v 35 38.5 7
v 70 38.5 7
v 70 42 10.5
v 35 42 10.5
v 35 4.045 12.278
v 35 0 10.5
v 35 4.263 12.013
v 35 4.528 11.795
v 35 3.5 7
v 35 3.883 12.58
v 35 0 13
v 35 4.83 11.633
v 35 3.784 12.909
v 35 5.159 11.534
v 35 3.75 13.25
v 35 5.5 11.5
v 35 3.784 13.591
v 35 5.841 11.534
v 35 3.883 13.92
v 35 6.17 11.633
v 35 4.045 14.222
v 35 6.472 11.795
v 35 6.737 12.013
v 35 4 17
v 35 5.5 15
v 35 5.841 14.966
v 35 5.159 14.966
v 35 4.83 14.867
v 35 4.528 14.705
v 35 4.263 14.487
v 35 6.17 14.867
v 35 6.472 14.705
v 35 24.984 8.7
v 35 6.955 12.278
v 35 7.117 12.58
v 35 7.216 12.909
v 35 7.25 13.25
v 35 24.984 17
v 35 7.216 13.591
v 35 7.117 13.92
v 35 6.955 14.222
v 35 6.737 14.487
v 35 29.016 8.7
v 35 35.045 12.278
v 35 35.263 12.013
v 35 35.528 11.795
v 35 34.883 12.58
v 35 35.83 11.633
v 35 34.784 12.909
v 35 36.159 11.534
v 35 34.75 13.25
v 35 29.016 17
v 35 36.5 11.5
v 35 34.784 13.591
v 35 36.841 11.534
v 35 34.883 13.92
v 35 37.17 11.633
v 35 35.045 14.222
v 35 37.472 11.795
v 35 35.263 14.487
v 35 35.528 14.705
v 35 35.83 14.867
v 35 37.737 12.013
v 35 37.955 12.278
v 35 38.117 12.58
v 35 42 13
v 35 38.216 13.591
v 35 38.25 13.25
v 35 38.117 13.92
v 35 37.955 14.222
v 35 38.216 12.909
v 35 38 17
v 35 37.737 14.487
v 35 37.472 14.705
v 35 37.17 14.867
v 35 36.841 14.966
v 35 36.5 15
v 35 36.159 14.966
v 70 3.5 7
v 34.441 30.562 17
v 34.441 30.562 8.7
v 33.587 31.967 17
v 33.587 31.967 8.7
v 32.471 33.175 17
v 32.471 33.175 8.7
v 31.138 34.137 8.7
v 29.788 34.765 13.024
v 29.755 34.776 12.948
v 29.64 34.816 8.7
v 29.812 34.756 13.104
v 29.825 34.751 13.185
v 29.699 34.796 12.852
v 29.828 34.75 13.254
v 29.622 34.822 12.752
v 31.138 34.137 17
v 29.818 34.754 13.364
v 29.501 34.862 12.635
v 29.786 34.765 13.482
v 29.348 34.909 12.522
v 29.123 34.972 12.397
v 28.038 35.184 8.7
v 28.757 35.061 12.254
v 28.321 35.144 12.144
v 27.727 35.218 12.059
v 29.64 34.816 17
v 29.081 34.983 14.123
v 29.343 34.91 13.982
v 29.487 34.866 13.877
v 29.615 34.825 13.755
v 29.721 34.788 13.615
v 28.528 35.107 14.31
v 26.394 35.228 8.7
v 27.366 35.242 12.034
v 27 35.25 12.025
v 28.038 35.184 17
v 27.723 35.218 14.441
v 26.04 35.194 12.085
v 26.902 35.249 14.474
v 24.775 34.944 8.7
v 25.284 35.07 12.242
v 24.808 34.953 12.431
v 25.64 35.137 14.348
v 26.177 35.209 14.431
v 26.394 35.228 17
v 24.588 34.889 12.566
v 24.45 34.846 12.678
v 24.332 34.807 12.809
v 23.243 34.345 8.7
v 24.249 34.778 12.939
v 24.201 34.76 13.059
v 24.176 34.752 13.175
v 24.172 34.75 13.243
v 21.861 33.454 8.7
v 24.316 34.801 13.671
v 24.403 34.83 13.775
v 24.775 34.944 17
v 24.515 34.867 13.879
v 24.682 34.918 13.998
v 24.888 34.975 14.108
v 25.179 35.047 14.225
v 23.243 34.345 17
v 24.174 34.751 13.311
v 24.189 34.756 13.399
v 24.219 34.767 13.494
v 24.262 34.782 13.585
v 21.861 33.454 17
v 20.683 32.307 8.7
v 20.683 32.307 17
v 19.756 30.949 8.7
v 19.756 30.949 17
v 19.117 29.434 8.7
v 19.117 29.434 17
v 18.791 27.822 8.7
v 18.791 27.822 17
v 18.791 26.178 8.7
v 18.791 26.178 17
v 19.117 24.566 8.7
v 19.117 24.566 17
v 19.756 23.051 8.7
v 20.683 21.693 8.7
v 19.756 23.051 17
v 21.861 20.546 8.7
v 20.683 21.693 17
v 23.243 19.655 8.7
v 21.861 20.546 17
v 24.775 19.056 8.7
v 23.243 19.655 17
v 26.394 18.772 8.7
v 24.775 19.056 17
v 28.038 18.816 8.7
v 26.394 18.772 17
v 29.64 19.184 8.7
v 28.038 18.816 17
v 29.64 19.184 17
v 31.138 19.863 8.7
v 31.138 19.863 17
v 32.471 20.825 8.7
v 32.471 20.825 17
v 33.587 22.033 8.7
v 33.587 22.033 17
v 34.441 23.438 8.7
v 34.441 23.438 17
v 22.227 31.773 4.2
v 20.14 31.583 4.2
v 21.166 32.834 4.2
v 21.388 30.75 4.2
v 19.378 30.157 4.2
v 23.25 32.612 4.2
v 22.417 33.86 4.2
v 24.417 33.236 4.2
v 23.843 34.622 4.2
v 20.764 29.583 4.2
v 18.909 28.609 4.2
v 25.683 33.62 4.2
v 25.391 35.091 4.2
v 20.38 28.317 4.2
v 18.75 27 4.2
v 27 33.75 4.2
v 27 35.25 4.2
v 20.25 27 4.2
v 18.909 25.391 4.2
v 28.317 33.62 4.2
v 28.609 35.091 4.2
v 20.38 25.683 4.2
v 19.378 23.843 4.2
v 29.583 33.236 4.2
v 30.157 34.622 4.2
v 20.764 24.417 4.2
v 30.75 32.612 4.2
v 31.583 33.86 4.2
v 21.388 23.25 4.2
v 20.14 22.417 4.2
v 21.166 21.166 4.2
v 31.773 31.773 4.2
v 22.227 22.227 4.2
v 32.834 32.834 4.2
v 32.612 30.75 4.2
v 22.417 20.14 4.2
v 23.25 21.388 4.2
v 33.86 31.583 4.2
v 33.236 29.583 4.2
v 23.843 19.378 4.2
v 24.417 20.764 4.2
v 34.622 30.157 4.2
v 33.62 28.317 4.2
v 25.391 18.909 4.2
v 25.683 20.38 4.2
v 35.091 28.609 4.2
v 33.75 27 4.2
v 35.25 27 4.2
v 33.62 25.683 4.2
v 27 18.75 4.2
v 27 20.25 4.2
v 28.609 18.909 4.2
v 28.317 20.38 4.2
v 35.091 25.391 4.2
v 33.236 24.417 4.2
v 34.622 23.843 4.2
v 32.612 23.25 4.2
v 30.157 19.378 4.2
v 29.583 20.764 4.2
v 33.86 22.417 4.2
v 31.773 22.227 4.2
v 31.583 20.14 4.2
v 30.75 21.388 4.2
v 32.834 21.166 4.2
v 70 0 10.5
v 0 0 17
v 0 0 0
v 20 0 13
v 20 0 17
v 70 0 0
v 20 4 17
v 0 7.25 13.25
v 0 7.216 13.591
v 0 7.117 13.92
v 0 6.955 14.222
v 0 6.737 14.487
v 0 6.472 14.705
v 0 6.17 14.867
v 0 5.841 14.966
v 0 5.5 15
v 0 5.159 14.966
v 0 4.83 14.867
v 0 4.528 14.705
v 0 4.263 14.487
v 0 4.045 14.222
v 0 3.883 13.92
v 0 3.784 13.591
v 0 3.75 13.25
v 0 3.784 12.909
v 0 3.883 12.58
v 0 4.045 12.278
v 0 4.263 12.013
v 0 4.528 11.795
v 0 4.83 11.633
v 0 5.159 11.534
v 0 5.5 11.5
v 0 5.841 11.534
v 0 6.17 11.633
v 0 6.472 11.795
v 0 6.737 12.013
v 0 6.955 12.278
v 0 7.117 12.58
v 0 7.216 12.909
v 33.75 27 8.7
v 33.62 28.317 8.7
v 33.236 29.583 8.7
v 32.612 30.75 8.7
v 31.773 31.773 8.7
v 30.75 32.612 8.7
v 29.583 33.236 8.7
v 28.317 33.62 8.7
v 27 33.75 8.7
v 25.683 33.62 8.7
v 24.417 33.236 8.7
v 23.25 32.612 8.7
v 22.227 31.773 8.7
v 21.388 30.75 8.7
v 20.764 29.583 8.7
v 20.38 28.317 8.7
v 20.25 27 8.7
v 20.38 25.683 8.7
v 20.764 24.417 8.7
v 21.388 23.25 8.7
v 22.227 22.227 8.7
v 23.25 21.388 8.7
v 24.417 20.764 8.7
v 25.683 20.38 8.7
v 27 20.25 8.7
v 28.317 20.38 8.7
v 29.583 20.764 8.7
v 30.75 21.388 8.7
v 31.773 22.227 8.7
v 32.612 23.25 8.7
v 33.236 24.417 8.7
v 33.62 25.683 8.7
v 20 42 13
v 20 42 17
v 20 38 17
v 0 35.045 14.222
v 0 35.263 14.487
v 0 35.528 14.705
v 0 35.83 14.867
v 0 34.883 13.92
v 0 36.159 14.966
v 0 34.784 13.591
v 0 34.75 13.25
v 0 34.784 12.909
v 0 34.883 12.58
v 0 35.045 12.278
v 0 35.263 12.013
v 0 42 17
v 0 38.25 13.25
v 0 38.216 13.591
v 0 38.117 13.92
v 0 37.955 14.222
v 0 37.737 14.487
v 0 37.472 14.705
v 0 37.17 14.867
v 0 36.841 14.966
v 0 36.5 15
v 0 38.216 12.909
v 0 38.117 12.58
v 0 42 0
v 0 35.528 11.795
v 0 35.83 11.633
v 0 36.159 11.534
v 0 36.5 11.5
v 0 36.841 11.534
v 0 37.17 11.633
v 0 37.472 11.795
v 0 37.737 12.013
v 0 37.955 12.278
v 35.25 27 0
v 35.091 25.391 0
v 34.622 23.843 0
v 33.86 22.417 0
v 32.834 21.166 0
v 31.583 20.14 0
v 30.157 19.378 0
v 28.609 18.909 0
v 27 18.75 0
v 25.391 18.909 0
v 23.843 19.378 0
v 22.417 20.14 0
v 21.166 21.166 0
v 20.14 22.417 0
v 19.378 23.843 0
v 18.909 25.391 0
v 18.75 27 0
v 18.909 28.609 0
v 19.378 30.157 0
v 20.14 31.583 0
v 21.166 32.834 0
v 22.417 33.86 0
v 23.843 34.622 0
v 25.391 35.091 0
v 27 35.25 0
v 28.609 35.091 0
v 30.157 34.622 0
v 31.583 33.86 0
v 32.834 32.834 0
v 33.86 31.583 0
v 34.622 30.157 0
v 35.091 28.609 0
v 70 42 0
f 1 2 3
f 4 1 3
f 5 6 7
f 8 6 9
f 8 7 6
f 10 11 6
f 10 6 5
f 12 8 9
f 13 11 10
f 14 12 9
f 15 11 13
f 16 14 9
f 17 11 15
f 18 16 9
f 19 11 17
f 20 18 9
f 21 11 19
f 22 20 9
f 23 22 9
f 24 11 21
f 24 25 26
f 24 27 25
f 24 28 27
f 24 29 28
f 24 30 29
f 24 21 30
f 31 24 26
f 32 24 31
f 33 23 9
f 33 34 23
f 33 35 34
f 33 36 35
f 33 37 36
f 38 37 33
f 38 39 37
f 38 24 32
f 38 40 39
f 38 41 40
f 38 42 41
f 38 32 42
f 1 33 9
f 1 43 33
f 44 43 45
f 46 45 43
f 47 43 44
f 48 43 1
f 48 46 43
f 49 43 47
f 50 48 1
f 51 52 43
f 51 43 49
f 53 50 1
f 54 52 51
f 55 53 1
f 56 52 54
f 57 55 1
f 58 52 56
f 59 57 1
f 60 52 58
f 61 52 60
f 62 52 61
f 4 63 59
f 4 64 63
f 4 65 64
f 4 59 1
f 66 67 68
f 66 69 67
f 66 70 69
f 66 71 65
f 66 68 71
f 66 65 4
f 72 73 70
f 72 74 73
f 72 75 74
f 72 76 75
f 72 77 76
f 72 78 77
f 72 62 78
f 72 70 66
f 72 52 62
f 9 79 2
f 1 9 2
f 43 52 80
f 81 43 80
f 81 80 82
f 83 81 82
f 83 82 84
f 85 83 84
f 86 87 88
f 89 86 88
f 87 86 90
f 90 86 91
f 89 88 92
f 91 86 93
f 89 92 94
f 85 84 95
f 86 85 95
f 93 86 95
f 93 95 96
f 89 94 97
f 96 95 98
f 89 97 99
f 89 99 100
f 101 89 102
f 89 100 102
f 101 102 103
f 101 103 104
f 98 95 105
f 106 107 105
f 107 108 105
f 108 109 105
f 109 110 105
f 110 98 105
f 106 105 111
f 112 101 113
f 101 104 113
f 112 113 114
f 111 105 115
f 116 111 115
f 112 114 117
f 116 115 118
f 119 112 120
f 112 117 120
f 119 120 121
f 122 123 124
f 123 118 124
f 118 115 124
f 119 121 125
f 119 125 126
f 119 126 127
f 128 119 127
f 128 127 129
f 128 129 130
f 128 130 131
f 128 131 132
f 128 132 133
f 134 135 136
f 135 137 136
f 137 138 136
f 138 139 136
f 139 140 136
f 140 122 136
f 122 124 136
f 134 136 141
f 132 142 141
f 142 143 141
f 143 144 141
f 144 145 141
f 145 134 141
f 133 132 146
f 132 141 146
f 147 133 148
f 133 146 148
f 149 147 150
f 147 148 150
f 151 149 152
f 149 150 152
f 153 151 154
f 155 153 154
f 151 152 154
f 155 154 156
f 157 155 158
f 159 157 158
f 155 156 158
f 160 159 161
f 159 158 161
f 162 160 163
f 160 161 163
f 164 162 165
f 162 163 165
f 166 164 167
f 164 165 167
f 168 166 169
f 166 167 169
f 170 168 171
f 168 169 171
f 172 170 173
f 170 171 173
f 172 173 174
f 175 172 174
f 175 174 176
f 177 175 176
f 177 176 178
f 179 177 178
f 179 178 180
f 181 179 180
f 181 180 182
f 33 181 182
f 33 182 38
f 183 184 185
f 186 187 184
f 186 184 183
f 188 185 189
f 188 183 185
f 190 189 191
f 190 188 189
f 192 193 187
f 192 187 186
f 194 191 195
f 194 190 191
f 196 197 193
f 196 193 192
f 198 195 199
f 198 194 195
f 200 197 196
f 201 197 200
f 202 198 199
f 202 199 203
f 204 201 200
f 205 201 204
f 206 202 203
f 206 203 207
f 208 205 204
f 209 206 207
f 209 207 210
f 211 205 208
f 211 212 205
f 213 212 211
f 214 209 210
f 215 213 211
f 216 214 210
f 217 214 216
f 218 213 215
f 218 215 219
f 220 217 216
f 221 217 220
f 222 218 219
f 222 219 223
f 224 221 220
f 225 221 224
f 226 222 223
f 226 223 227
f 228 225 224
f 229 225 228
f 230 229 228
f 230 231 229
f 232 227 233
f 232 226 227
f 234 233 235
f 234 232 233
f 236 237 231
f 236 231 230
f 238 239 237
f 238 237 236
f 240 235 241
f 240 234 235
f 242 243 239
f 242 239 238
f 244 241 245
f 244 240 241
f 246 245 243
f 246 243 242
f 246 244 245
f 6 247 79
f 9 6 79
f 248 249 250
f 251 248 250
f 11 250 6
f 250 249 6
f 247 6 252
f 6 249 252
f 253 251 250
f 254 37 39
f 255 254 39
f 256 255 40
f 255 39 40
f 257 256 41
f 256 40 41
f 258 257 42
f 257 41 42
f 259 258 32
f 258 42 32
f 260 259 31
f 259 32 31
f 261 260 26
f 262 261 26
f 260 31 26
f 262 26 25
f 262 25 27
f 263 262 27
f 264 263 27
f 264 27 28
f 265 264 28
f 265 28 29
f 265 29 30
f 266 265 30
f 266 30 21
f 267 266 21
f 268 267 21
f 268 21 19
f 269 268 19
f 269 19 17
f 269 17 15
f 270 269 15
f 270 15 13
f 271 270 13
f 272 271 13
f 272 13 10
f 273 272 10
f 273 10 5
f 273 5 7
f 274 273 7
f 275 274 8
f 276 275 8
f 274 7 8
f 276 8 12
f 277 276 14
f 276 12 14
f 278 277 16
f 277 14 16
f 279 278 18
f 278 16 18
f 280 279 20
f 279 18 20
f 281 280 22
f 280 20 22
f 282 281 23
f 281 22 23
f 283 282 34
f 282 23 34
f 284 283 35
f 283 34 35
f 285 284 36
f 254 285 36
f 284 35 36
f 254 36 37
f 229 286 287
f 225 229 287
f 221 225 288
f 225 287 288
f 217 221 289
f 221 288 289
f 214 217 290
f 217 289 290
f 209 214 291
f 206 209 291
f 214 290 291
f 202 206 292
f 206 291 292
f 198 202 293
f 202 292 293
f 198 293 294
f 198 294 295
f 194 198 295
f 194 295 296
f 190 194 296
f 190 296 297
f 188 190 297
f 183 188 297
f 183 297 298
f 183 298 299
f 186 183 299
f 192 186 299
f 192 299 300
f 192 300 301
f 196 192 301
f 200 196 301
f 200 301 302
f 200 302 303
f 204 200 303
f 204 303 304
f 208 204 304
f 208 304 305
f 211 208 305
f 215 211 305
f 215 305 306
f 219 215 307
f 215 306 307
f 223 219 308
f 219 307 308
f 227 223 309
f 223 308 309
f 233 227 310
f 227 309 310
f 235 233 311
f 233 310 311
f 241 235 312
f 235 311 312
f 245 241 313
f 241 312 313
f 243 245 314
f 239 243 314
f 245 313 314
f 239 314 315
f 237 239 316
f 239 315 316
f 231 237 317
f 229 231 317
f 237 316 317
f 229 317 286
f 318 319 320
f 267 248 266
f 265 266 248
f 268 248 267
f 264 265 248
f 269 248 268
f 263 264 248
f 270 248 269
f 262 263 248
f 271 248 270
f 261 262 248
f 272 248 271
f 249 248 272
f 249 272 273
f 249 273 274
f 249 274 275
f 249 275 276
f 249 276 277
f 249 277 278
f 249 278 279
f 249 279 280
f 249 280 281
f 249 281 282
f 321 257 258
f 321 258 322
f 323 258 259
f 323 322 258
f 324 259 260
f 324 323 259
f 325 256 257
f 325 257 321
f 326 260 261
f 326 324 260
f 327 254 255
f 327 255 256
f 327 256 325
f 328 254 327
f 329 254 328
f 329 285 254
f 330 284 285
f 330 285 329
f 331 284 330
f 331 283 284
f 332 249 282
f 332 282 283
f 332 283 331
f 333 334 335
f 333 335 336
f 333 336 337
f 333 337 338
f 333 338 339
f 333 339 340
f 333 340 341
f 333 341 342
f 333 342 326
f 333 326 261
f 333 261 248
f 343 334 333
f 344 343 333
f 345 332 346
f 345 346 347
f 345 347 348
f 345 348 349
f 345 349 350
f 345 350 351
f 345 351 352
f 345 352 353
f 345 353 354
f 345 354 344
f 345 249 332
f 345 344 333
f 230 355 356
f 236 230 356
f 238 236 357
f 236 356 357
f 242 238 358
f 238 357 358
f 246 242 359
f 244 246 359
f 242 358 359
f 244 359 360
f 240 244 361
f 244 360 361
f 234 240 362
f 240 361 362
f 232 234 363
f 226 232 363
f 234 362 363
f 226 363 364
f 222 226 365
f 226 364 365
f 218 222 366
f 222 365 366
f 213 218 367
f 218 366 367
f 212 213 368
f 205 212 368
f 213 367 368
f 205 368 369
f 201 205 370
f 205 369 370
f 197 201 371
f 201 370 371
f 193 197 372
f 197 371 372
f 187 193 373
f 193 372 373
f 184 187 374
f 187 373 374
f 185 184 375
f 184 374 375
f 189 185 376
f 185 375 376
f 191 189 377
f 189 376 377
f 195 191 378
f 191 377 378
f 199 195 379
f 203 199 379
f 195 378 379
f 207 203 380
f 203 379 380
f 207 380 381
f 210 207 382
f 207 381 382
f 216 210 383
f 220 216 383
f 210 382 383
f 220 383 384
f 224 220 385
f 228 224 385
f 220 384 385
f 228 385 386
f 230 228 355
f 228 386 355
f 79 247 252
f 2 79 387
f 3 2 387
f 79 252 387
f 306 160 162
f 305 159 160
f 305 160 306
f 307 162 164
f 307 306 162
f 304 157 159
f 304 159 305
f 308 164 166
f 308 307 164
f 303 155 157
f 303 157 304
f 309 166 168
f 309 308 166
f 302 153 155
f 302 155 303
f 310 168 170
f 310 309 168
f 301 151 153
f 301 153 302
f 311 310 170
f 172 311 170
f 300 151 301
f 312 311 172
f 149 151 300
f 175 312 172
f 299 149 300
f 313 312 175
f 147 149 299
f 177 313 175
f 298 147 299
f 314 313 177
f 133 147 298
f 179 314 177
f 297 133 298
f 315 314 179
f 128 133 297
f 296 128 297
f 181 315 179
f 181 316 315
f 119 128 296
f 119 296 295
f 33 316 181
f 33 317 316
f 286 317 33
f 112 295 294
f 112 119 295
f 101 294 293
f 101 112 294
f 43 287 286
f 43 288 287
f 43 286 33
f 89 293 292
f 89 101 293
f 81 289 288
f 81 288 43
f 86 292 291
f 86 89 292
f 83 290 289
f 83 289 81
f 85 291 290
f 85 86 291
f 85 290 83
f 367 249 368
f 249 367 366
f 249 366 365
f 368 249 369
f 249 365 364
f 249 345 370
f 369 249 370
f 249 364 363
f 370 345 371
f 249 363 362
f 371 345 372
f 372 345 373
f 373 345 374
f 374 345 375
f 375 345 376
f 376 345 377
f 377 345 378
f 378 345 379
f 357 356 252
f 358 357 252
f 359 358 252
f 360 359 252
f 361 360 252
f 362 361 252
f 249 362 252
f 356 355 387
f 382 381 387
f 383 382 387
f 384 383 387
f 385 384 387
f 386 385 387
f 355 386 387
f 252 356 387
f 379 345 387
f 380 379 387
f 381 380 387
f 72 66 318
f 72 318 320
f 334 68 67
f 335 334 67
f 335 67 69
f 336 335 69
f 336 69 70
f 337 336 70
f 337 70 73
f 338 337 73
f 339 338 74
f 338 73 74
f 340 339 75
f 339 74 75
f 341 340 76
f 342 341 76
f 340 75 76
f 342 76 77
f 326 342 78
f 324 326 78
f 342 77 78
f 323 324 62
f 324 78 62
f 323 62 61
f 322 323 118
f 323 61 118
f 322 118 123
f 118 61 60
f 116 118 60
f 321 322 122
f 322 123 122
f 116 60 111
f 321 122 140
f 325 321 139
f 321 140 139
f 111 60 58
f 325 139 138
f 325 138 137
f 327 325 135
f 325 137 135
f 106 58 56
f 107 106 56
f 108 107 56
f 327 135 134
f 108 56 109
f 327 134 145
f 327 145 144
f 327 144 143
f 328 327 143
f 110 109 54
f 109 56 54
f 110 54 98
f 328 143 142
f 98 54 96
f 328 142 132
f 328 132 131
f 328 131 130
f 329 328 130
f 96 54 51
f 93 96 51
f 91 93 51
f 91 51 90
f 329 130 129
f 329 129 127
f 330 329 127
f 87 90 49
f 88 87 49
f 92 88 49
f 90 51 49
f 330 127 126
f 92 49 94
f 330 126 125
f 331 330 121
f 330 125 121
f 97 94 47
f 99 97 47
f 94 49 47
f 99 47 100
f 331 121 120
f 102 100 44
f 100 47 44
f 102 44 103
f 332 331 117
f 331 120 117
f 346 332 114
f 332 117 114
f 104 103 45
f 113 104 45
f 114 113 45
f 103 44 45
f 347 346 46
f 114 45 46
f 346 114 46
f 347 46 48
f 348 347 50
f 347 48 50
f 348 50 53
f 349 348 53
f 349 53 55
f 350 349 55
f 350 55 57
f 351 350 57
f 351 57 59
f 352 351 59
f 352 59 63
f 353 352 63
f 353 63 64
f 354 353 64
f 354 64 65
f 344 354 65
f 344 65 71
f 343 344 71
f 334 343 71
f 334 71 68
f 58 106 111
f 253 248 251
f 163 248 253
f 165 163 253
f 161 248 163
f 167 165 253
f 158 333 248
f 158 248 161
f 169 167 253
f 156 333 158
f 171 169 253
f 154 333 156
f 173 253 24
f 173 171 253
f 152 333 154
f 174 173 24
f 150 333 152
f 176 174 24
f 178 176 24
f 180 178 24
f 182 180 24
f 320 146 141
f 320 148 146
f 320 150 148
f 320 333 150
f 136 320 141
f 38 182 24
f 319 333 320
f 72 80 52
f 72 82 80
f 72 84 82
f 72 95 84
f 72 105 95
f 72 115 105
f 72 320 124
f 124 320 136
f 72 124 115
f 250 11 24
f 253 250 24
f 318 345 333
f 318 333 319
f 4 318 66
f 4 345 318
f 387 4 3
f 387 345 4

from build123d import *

# Parameters (mm, degrees)
BOX_W           = 70
BOX_H           = 42
BOX_DEPTH       = 17
SKETCH_R        = 1.75
POCKET_DEPTH    = 70.001
POCKET001_DEPTH = 50
POCKET002_DEPTH = 35
SKETCH003_R     = 6.75
POCKET003_DEPTH = 17.001
SKETCH004_R     = 8.25
POCKET004_DEPTH = 8.3
SKETCH005_R     = 8.25
POCKET005_DEPTH = 4.2


with BuildPart() as part:
    # Box → Box (new body)
    with BuildSketch(Plane.XY):
        with Locations((35, 21)):
            Rectangle(BOX_W, BOX_H)
    extrude(amount=BOX_DEPTH)

    # Sketch (on Face2 of BaseFeature) → Pocket (cut, through all)
    with BuildSketch(Plane.YZ.offset(70)):
        with Locations((5.5, 13.25)):
            Circle(SKETCH_R)
        with Locations((36.5, 13.25)):
            Circle(SKETCH_R)
    extrude(amount=-POCKET_DEPTH, mode=Mode.SUBTRACT)

    # Sketch001 (on Face2 of BaseFeature) → Pocket001 (cut)
    with BuildSketch(Plane.YZ.offset(70)):
        Polygon((4, 17), (0, 17), (0, 13), align=None)
        Polygon((38, 17), (42, 17), (42, 13), align=None)
    extrude(amount=-POCKET001_DEPTH, mode=Mode.SUBTRACT)

    # Sketch002 (on Face8 of Pocket001) → Pocket002 (cut)
    with BuildSketch(Plane.YZ.offset(70)):
        Polygon((4, 17), (0, 13), (0, 10.5), (3.5, 7), (38.5, 7), (42, 10.5), (42, 13), (38, 17), align=None)
    extrude(amount=-POCKET002_DEPTH, mode=Mode.SUBTRACT)

    # Sketch003 (on Face3 of Pocket002) → Pocket003 (cut, through all)
    with BuildSketch(Plane.XY.offset(17)):
        with Locations((27, 27)):
            Circle(SKETCH003_R)
    extrude(amount=-POCKET003_DEPTH, mode=Mode.SUBTRACT)

    # Sketch004 (on Face3 of Pocket003) → Pocket004 (cut)
    with BuildSketch(Plane.XY.offset(17)):
        with Locations((27, 27)):
            Circle(SKETCH004_R)
    extrude(amount=-POCKET004_DEPTH, mode=Mode.SUBTRACT)

    # Sketch005 (on Face4 of Pocket004) → Pocket005 (cut)
    with BuildSketch(Plane(origin=(0, 0, 0), x_dir=(1, 0, 0), z_dir=(0, 0, -1))):
        with Locations((27, -27)):
            Circle(SKETCH005_R)
    extrude(amount=-POCKET005_DEPTH, mode=Mode.SUBTRACT)


solid = part.part
